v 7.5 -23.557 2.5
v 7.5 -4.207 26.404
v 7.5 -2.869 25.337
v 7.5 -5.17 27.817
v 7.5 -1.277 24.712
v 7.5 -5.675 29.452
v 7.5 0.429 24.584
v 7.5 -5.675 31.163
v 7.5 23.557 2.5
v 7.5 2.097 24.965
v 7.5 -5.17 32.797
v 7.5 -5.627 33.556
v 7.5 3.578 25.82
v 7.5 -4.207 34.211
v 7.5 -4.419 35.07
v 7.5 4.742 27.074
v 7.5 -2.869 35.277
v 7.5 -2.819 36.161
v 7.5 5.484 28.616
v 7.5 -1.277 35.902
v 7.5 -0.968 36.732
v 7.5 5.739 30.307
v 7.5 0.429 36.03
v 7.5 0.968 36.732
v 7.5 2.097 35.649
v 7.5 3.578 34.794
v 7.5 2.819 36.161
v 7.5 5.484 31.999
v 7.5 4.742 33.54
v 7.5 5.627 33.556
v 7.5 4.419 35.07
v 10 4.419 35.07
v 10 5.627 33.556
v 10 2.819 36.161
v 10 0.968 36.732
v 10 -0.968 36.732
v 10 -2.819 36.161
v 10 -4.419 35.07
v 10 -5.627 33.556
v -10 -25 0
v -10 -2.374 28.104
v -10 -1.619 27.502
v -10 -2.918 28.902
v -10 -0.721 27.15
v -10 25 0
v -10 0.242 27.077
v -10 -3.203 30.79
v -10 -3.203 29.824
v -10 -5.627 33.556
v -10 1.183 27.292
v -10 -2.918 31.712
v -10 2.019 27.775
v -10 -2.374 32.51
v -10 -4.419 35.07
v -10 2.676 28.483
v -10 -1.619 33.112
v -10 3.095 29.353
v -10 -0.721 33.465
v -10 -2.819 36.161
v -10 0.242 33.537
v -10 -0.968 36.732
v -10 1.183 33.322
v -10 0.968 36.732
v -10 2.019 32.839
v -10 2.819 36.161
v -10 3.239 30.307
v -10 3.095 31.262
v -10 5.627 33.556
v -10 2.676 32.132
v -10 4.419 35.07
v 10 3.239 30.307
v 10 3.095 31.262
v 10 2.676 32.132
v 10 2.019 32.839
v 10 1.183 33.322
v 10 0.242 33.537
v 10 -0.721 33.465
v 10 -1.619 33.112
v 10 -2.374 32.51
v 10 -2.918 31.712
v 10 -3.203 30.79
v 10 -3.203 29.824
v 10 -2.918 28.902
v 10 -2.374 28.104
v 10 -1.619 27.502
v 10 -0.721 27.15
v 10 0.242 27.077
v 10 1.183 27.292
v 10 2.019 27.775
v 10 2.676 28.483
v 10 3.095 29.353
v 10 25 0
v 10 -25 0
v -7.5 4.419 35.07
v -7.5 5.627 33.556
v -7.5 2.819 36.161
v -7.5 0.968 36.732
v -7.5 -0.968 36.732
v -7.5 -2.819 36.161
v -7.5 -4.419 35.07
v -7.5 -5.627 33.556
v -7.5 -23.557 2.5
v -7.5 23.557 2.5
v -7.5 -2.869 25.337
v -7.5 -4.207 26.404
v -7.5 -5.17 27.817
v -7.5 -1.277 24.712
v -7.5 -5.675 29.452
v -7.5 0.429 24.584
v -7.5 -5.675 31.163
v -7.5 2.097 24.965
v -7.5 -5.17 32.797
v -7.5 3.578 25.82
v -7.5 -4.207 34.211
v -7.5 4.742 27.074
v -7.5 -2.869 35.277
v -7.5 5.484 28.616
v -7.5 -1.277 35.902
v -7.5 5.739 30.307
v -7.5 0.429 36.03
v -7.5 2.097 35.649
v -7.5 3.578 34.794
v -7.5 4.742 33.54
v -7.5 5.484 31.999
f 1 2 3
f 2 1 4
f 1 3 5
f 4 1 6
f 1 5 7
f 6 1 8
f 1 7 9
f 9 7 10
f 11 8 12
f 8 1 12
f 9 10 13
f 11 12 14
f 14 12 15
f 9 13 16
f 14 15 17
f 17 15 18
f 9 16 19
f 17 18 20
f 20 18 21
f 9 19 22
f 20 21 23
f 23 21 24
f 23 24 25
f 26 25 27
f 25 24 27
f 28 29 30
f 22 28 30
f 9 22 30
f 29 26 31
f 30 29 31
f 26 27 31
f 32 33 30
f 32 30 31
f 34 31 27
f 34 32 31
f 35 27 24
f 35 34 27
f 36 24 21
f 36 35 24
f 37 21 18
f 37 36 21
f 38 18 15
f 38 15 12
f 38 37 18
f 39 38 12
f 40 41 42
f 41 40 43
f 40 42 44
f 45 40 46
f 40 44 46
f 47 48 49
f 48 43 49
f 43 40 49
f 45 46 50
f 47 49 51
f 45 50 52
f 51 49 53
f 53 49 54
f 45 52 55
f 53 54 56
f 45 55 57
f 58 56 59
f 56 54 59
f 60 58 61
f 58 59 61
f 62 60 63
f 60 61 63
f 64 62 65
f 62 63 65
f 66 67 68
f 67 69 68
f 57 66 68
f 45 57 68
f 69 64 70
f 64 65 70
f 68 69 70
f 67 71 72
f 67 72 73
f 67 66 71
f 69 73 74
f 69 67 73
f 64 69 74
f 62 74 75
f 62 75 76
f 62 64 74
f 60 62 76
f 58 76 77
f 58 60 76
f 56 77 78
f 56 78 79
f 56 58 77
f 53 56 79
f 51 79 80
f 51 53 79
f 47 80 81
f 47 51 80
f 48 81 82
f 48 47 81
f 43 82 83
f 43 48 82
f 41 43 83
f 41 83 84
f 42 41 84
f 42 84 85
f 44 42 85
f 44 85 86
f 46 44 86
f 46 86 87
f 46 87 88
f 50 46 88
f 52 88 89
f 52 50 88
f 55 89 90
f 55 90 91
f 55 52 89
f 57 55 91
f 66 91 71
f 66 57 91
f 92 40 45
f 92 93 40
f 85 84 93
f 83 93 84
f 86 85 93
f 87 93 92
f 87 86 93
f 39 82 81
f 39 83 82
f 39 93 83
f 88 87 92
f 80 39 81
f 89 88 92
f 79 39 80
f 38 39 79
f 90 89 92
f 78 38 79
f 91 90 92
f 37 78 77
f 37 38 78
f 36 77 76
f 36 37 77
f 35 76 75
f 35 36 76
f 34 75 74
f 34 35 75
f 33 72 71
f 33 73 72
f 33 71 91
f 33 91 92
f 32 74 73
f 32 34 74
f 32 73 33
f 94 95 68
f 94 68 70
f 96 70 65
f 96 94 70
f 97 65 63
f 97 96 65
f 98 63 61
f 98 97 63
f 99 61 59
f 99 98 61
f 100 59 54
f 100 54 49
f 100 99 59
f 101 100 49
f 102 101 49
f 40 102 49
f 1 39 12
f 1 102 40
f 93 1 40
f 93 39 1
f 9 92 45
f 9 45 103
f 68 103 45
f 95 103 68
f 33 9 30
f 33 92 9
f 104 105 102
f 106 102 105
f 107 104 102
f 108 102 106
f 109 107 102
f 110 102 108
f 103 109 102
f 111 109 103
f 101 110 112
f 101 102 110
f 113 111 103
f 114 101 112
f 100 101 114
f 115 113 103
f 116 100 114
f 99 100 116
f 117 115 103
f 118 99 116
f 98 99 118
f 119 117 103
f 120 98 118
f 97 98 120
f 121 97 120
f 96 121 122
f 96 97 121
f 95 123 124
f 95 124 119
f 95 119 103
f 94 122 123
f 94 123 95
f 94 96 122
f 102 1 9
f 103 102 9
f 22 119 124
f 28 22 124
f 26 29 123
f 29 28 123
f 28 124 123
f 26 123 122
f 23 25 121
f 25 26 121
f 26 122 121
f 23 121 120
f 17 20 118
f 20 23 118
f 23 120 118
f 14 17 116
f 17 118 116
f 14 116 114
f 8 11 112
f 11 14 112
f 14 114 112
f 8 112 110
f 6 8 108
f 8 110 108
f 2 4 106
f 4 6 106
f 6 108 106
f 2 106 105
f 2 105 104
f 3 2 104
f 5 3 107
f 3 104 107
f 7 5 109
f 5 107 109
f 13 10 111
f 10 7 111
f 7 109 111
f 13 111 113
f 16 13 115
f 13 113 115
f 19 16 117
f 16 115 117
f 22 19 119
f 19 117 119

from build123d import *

# Parameters (mm, degrees)
F0_R     = 3.238814
F1_DEPTH = 10
F2_T     = -2.5


with BuildPart() as f1:
    # F0 (on Right) → F1 (new body, symmetric)
    with BuildSketch(Plane.YZ):
        with BuildLine():
            Line((-25, 0), (0, 0))
            Line((0, 0), (25, 0))
            Line((25, 0), (5.626596, 33.55572))
            ThreePointArc((5.626596, 33.55572), (0, 36.804237), (-5.626596, 33.55572))
            Line((-5.626596, 33.55572), (-25, 0))
        make_face()
        with Locations((0, 30.307204)):
            Circle(F0_R, mode=Mode.SUBTRACT)
    extrude(amount=F1_DEPTH, both=True)

    # F2
    f2_openings = [f1.faces().sort_by_distance(p)[0] for p in [
        (0, 15.313298, 16.77786),
        (0, -15.313298, 16.77786),
        (0, 0, 36.804237),
    ]]
    offset(amount=F2_T, openings=f2_openings)


solid = f1.part
